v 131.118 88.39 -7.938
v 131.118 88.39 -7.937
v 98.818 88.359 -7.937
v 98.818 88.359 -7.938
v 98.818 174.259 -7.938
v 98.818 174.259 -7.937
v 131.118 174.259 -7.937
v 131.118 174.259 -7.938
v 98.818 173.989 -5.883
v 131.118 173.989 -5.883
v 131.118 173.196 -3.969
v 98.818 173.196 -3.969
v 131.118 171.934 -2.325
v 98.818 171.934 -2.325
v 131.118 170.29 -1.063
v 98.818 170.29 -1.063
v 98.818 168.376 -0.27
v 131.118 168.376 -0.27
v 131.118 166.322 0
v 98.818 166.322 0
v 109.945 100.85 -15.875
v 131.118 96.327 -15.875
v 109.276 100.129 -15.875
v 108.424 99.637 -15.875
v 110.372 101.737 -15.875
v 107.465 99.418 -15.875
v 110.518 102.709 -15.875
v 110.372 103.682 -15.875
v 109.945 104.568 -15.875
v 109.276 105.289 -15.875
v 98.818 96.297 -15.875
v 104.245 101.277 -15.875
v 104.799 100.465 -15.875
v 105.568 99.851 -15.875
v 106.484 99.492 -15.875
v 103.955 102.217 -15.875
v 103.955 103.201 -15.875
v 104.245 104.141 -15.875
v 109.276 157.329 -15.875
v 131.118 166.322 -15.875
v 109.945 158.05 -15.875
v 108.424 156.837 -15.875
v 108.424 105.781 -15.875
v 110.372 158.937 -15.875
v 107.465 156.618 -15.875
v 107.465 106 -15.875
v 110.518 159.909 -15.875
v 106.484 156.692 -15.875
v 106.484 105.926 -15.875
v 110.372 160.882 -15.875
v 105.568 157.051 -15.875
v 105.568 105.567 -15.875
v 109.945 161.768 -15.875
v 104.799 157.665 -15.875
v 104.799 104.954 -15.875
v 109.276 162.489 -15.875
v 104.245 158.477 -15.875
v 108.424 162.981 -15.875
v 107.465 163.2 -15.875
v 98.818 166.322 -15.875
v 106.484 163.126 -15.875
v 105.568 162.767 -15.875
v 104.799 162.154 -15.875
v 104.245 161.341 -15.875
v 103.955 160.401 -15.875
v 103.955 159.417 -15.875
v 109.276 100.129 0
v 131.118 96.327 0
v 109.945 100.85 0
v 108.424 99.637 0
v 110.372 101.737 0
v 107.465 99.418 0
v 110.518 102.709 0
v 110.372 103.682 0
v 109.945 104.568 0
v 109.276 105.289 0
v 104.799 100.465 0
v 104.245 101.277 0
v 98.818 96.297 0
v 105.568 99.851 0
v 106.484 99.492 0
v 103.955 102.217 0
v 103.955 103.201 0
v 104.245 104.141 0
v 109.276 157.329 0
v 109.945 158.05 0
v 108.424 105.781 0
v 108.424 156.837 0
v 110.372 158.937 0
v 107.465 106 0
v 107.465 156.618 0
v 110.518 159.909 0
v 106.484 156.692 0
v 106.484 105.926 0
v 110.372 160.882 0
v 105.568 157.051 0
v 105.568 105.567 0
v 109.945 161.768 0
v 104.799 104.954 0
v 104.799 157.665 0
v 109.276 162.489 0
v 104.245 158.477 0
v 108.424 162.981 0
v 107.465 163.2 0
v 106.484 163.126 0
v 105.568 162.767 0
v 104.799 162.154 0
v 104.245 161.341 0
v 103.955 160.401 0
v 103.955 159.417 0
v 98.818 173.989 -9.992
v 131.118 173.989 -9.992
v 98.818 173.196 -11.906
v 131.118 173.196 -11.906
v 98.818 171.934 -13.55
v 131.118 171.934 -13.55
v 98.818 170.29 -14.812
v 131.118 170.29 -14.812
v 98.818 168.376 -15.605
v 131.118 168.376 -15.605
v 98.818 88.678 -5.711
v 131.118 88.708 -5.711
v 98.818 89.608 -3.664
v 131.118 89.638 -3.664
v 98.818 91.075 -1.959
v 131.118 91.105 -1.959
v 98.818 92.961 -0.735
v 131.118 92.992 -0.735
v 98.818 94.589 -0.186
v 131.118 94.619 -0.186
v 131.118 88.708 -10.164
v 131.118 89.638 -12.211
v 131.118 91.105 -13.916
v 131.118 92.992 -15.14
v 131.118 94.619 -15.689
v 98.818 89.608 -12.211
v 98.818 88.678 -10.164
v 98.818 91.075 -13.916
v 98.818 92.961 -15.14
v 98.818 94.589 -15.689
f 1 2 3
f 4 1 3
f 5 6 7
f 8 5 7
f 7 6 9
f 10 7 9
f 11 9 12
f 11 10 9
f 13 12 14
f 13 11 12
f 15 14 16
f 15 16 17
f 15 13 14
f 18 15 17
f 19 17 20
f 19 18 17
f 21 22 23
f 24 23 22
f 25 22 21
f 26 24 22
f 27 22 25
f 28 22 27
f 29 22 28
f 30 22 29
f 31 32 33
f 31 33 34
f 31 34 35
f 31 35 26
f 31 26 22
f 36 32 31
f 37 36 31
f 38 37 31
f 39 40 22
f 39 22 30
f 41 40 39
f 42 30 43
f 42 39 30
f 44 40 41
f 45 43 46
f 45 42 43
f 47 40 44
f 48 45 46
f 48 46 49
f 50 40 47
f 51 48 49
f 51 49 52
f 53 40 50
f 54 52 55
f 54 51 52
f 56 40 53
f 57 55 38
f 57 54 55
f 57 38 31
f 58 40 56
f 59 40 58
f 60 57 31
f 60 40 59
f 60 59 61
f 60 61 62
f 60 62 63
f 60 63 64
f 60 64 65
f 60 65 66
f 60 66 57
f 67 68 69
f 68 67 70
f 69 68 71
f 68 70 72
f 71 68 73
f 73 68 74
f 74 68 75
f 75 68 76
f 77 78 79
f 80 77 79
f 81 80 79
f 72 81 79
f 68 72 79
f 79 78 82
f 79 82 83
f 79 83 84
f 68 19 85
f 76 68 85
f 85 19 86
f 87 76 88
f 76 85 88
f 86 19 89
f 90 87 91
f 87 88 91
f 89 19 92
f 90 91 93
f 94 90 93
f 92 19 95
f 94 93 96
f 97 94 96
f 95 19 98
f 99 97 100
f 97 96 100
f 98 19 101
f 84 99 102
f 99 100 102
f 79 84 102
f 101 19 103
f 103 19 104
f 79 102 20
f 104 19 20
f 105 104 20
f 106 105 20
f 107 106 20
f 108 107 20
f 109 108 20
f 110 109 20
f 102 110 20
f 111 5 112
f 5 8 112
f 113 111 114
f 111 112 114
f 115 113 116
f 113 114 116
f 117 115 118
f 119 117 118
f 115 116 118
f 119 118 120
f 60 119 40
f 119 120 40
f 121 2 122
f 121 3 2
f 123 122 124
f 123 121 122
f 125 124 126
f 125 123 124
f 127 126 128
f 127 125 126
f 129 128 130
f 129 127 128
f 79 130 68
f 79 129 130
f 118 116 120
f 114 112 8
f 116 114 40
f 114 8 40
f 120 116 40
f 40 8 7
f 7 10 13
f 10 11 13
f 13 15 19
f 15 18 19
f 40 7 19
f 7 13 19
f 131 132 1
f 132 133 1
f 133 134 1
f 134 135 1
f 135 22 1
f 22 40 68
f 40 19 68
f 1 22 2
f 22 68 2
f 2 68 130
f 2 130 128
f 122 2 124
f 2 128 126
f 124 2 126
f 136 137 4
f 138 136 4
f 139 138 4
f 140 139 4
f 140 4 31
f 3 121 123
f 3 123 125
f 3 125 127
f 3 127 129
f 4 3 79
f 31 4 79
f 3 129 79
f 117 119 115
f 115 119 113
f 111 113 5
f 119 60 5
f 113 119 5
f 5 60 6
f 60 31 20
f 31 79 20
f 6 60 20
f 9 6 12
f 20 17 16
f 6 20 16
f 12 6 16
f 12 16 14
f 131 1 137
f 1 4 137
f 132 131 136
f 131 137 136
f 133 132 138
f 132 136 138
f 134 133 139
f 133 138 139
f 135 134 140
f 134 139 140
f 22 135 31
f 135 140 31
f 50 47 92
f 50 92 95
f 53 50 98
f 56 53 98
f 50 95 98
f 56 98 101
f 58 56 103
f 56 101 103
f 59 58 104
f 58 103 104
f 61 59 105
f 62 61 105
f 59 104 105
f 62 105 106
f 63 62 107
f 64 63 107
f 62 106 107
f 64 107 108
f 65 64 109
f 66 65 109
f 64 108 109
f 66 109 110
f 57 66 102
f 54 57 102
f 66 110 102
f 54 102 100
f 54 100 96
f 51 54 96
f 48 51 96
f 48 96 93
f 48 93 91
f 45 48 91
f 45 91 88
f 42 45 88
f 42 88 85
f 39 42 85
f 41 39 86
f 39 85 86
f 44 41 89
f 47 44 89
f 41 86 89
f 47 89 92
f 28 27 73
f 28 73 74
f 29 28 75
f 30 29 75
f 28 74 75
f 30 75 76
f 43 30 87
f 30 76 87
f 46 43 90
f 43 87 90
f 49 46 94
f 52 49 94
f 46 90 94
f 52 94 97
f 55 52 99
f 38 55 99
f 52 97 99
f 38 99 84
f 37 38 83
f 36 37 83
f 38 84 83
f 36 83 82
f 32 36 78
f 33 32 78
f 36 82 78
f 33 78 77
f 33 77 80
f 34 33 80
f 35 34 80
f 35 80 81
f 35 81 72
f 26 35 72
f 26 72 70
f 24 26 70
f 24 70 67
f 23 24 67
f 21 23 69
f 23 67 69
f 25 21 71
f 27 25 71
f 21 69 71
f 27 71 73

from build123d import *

# Parameters (mm, degrees)
SKETCH1_R      = 3.2999934
EXTRUDE1_DEPTH = 15.875
FILLET1_R      = 7.9375


with BuildPart() as part:
    # Sketch1 → Extrude1 (new body)
    with BuildSketch(Plane.XY):
        Polygon((131.1183814, 88.3896378), (98.8183698, 88.3592086), (98.8183698, 174.2591892), (131.1183814, 174.2591892), align=None)
        with Locations((107.2183784, 102.7091926)):
            Circle(SKETCH1_R, mode=Mode.SUBTRACT)
        with Locations((107.2183784, 159.9092052)):
            Circle(SKETCH1_R, mode=Mode.SUBTRACT)
    extrude(amount=-EXTRUDE1_DEPTH)

    # Fillet1
    fillet1_edges = [part.edges().sort_by_distance(p)[0] for p in [
        (114.9683756, 88.3744232, -15.875),
        (114.9683756, 88.3744232, 0),
        (114.9683756, 174.2591892, -15.875),
        (114.9683756, 174.2591892, 0),
    ]]
    fillet(fillet1_edges, radius=FILLET1_R - 0.0001)  # a hair under: the kernel refuses the full size


solid = part.part
